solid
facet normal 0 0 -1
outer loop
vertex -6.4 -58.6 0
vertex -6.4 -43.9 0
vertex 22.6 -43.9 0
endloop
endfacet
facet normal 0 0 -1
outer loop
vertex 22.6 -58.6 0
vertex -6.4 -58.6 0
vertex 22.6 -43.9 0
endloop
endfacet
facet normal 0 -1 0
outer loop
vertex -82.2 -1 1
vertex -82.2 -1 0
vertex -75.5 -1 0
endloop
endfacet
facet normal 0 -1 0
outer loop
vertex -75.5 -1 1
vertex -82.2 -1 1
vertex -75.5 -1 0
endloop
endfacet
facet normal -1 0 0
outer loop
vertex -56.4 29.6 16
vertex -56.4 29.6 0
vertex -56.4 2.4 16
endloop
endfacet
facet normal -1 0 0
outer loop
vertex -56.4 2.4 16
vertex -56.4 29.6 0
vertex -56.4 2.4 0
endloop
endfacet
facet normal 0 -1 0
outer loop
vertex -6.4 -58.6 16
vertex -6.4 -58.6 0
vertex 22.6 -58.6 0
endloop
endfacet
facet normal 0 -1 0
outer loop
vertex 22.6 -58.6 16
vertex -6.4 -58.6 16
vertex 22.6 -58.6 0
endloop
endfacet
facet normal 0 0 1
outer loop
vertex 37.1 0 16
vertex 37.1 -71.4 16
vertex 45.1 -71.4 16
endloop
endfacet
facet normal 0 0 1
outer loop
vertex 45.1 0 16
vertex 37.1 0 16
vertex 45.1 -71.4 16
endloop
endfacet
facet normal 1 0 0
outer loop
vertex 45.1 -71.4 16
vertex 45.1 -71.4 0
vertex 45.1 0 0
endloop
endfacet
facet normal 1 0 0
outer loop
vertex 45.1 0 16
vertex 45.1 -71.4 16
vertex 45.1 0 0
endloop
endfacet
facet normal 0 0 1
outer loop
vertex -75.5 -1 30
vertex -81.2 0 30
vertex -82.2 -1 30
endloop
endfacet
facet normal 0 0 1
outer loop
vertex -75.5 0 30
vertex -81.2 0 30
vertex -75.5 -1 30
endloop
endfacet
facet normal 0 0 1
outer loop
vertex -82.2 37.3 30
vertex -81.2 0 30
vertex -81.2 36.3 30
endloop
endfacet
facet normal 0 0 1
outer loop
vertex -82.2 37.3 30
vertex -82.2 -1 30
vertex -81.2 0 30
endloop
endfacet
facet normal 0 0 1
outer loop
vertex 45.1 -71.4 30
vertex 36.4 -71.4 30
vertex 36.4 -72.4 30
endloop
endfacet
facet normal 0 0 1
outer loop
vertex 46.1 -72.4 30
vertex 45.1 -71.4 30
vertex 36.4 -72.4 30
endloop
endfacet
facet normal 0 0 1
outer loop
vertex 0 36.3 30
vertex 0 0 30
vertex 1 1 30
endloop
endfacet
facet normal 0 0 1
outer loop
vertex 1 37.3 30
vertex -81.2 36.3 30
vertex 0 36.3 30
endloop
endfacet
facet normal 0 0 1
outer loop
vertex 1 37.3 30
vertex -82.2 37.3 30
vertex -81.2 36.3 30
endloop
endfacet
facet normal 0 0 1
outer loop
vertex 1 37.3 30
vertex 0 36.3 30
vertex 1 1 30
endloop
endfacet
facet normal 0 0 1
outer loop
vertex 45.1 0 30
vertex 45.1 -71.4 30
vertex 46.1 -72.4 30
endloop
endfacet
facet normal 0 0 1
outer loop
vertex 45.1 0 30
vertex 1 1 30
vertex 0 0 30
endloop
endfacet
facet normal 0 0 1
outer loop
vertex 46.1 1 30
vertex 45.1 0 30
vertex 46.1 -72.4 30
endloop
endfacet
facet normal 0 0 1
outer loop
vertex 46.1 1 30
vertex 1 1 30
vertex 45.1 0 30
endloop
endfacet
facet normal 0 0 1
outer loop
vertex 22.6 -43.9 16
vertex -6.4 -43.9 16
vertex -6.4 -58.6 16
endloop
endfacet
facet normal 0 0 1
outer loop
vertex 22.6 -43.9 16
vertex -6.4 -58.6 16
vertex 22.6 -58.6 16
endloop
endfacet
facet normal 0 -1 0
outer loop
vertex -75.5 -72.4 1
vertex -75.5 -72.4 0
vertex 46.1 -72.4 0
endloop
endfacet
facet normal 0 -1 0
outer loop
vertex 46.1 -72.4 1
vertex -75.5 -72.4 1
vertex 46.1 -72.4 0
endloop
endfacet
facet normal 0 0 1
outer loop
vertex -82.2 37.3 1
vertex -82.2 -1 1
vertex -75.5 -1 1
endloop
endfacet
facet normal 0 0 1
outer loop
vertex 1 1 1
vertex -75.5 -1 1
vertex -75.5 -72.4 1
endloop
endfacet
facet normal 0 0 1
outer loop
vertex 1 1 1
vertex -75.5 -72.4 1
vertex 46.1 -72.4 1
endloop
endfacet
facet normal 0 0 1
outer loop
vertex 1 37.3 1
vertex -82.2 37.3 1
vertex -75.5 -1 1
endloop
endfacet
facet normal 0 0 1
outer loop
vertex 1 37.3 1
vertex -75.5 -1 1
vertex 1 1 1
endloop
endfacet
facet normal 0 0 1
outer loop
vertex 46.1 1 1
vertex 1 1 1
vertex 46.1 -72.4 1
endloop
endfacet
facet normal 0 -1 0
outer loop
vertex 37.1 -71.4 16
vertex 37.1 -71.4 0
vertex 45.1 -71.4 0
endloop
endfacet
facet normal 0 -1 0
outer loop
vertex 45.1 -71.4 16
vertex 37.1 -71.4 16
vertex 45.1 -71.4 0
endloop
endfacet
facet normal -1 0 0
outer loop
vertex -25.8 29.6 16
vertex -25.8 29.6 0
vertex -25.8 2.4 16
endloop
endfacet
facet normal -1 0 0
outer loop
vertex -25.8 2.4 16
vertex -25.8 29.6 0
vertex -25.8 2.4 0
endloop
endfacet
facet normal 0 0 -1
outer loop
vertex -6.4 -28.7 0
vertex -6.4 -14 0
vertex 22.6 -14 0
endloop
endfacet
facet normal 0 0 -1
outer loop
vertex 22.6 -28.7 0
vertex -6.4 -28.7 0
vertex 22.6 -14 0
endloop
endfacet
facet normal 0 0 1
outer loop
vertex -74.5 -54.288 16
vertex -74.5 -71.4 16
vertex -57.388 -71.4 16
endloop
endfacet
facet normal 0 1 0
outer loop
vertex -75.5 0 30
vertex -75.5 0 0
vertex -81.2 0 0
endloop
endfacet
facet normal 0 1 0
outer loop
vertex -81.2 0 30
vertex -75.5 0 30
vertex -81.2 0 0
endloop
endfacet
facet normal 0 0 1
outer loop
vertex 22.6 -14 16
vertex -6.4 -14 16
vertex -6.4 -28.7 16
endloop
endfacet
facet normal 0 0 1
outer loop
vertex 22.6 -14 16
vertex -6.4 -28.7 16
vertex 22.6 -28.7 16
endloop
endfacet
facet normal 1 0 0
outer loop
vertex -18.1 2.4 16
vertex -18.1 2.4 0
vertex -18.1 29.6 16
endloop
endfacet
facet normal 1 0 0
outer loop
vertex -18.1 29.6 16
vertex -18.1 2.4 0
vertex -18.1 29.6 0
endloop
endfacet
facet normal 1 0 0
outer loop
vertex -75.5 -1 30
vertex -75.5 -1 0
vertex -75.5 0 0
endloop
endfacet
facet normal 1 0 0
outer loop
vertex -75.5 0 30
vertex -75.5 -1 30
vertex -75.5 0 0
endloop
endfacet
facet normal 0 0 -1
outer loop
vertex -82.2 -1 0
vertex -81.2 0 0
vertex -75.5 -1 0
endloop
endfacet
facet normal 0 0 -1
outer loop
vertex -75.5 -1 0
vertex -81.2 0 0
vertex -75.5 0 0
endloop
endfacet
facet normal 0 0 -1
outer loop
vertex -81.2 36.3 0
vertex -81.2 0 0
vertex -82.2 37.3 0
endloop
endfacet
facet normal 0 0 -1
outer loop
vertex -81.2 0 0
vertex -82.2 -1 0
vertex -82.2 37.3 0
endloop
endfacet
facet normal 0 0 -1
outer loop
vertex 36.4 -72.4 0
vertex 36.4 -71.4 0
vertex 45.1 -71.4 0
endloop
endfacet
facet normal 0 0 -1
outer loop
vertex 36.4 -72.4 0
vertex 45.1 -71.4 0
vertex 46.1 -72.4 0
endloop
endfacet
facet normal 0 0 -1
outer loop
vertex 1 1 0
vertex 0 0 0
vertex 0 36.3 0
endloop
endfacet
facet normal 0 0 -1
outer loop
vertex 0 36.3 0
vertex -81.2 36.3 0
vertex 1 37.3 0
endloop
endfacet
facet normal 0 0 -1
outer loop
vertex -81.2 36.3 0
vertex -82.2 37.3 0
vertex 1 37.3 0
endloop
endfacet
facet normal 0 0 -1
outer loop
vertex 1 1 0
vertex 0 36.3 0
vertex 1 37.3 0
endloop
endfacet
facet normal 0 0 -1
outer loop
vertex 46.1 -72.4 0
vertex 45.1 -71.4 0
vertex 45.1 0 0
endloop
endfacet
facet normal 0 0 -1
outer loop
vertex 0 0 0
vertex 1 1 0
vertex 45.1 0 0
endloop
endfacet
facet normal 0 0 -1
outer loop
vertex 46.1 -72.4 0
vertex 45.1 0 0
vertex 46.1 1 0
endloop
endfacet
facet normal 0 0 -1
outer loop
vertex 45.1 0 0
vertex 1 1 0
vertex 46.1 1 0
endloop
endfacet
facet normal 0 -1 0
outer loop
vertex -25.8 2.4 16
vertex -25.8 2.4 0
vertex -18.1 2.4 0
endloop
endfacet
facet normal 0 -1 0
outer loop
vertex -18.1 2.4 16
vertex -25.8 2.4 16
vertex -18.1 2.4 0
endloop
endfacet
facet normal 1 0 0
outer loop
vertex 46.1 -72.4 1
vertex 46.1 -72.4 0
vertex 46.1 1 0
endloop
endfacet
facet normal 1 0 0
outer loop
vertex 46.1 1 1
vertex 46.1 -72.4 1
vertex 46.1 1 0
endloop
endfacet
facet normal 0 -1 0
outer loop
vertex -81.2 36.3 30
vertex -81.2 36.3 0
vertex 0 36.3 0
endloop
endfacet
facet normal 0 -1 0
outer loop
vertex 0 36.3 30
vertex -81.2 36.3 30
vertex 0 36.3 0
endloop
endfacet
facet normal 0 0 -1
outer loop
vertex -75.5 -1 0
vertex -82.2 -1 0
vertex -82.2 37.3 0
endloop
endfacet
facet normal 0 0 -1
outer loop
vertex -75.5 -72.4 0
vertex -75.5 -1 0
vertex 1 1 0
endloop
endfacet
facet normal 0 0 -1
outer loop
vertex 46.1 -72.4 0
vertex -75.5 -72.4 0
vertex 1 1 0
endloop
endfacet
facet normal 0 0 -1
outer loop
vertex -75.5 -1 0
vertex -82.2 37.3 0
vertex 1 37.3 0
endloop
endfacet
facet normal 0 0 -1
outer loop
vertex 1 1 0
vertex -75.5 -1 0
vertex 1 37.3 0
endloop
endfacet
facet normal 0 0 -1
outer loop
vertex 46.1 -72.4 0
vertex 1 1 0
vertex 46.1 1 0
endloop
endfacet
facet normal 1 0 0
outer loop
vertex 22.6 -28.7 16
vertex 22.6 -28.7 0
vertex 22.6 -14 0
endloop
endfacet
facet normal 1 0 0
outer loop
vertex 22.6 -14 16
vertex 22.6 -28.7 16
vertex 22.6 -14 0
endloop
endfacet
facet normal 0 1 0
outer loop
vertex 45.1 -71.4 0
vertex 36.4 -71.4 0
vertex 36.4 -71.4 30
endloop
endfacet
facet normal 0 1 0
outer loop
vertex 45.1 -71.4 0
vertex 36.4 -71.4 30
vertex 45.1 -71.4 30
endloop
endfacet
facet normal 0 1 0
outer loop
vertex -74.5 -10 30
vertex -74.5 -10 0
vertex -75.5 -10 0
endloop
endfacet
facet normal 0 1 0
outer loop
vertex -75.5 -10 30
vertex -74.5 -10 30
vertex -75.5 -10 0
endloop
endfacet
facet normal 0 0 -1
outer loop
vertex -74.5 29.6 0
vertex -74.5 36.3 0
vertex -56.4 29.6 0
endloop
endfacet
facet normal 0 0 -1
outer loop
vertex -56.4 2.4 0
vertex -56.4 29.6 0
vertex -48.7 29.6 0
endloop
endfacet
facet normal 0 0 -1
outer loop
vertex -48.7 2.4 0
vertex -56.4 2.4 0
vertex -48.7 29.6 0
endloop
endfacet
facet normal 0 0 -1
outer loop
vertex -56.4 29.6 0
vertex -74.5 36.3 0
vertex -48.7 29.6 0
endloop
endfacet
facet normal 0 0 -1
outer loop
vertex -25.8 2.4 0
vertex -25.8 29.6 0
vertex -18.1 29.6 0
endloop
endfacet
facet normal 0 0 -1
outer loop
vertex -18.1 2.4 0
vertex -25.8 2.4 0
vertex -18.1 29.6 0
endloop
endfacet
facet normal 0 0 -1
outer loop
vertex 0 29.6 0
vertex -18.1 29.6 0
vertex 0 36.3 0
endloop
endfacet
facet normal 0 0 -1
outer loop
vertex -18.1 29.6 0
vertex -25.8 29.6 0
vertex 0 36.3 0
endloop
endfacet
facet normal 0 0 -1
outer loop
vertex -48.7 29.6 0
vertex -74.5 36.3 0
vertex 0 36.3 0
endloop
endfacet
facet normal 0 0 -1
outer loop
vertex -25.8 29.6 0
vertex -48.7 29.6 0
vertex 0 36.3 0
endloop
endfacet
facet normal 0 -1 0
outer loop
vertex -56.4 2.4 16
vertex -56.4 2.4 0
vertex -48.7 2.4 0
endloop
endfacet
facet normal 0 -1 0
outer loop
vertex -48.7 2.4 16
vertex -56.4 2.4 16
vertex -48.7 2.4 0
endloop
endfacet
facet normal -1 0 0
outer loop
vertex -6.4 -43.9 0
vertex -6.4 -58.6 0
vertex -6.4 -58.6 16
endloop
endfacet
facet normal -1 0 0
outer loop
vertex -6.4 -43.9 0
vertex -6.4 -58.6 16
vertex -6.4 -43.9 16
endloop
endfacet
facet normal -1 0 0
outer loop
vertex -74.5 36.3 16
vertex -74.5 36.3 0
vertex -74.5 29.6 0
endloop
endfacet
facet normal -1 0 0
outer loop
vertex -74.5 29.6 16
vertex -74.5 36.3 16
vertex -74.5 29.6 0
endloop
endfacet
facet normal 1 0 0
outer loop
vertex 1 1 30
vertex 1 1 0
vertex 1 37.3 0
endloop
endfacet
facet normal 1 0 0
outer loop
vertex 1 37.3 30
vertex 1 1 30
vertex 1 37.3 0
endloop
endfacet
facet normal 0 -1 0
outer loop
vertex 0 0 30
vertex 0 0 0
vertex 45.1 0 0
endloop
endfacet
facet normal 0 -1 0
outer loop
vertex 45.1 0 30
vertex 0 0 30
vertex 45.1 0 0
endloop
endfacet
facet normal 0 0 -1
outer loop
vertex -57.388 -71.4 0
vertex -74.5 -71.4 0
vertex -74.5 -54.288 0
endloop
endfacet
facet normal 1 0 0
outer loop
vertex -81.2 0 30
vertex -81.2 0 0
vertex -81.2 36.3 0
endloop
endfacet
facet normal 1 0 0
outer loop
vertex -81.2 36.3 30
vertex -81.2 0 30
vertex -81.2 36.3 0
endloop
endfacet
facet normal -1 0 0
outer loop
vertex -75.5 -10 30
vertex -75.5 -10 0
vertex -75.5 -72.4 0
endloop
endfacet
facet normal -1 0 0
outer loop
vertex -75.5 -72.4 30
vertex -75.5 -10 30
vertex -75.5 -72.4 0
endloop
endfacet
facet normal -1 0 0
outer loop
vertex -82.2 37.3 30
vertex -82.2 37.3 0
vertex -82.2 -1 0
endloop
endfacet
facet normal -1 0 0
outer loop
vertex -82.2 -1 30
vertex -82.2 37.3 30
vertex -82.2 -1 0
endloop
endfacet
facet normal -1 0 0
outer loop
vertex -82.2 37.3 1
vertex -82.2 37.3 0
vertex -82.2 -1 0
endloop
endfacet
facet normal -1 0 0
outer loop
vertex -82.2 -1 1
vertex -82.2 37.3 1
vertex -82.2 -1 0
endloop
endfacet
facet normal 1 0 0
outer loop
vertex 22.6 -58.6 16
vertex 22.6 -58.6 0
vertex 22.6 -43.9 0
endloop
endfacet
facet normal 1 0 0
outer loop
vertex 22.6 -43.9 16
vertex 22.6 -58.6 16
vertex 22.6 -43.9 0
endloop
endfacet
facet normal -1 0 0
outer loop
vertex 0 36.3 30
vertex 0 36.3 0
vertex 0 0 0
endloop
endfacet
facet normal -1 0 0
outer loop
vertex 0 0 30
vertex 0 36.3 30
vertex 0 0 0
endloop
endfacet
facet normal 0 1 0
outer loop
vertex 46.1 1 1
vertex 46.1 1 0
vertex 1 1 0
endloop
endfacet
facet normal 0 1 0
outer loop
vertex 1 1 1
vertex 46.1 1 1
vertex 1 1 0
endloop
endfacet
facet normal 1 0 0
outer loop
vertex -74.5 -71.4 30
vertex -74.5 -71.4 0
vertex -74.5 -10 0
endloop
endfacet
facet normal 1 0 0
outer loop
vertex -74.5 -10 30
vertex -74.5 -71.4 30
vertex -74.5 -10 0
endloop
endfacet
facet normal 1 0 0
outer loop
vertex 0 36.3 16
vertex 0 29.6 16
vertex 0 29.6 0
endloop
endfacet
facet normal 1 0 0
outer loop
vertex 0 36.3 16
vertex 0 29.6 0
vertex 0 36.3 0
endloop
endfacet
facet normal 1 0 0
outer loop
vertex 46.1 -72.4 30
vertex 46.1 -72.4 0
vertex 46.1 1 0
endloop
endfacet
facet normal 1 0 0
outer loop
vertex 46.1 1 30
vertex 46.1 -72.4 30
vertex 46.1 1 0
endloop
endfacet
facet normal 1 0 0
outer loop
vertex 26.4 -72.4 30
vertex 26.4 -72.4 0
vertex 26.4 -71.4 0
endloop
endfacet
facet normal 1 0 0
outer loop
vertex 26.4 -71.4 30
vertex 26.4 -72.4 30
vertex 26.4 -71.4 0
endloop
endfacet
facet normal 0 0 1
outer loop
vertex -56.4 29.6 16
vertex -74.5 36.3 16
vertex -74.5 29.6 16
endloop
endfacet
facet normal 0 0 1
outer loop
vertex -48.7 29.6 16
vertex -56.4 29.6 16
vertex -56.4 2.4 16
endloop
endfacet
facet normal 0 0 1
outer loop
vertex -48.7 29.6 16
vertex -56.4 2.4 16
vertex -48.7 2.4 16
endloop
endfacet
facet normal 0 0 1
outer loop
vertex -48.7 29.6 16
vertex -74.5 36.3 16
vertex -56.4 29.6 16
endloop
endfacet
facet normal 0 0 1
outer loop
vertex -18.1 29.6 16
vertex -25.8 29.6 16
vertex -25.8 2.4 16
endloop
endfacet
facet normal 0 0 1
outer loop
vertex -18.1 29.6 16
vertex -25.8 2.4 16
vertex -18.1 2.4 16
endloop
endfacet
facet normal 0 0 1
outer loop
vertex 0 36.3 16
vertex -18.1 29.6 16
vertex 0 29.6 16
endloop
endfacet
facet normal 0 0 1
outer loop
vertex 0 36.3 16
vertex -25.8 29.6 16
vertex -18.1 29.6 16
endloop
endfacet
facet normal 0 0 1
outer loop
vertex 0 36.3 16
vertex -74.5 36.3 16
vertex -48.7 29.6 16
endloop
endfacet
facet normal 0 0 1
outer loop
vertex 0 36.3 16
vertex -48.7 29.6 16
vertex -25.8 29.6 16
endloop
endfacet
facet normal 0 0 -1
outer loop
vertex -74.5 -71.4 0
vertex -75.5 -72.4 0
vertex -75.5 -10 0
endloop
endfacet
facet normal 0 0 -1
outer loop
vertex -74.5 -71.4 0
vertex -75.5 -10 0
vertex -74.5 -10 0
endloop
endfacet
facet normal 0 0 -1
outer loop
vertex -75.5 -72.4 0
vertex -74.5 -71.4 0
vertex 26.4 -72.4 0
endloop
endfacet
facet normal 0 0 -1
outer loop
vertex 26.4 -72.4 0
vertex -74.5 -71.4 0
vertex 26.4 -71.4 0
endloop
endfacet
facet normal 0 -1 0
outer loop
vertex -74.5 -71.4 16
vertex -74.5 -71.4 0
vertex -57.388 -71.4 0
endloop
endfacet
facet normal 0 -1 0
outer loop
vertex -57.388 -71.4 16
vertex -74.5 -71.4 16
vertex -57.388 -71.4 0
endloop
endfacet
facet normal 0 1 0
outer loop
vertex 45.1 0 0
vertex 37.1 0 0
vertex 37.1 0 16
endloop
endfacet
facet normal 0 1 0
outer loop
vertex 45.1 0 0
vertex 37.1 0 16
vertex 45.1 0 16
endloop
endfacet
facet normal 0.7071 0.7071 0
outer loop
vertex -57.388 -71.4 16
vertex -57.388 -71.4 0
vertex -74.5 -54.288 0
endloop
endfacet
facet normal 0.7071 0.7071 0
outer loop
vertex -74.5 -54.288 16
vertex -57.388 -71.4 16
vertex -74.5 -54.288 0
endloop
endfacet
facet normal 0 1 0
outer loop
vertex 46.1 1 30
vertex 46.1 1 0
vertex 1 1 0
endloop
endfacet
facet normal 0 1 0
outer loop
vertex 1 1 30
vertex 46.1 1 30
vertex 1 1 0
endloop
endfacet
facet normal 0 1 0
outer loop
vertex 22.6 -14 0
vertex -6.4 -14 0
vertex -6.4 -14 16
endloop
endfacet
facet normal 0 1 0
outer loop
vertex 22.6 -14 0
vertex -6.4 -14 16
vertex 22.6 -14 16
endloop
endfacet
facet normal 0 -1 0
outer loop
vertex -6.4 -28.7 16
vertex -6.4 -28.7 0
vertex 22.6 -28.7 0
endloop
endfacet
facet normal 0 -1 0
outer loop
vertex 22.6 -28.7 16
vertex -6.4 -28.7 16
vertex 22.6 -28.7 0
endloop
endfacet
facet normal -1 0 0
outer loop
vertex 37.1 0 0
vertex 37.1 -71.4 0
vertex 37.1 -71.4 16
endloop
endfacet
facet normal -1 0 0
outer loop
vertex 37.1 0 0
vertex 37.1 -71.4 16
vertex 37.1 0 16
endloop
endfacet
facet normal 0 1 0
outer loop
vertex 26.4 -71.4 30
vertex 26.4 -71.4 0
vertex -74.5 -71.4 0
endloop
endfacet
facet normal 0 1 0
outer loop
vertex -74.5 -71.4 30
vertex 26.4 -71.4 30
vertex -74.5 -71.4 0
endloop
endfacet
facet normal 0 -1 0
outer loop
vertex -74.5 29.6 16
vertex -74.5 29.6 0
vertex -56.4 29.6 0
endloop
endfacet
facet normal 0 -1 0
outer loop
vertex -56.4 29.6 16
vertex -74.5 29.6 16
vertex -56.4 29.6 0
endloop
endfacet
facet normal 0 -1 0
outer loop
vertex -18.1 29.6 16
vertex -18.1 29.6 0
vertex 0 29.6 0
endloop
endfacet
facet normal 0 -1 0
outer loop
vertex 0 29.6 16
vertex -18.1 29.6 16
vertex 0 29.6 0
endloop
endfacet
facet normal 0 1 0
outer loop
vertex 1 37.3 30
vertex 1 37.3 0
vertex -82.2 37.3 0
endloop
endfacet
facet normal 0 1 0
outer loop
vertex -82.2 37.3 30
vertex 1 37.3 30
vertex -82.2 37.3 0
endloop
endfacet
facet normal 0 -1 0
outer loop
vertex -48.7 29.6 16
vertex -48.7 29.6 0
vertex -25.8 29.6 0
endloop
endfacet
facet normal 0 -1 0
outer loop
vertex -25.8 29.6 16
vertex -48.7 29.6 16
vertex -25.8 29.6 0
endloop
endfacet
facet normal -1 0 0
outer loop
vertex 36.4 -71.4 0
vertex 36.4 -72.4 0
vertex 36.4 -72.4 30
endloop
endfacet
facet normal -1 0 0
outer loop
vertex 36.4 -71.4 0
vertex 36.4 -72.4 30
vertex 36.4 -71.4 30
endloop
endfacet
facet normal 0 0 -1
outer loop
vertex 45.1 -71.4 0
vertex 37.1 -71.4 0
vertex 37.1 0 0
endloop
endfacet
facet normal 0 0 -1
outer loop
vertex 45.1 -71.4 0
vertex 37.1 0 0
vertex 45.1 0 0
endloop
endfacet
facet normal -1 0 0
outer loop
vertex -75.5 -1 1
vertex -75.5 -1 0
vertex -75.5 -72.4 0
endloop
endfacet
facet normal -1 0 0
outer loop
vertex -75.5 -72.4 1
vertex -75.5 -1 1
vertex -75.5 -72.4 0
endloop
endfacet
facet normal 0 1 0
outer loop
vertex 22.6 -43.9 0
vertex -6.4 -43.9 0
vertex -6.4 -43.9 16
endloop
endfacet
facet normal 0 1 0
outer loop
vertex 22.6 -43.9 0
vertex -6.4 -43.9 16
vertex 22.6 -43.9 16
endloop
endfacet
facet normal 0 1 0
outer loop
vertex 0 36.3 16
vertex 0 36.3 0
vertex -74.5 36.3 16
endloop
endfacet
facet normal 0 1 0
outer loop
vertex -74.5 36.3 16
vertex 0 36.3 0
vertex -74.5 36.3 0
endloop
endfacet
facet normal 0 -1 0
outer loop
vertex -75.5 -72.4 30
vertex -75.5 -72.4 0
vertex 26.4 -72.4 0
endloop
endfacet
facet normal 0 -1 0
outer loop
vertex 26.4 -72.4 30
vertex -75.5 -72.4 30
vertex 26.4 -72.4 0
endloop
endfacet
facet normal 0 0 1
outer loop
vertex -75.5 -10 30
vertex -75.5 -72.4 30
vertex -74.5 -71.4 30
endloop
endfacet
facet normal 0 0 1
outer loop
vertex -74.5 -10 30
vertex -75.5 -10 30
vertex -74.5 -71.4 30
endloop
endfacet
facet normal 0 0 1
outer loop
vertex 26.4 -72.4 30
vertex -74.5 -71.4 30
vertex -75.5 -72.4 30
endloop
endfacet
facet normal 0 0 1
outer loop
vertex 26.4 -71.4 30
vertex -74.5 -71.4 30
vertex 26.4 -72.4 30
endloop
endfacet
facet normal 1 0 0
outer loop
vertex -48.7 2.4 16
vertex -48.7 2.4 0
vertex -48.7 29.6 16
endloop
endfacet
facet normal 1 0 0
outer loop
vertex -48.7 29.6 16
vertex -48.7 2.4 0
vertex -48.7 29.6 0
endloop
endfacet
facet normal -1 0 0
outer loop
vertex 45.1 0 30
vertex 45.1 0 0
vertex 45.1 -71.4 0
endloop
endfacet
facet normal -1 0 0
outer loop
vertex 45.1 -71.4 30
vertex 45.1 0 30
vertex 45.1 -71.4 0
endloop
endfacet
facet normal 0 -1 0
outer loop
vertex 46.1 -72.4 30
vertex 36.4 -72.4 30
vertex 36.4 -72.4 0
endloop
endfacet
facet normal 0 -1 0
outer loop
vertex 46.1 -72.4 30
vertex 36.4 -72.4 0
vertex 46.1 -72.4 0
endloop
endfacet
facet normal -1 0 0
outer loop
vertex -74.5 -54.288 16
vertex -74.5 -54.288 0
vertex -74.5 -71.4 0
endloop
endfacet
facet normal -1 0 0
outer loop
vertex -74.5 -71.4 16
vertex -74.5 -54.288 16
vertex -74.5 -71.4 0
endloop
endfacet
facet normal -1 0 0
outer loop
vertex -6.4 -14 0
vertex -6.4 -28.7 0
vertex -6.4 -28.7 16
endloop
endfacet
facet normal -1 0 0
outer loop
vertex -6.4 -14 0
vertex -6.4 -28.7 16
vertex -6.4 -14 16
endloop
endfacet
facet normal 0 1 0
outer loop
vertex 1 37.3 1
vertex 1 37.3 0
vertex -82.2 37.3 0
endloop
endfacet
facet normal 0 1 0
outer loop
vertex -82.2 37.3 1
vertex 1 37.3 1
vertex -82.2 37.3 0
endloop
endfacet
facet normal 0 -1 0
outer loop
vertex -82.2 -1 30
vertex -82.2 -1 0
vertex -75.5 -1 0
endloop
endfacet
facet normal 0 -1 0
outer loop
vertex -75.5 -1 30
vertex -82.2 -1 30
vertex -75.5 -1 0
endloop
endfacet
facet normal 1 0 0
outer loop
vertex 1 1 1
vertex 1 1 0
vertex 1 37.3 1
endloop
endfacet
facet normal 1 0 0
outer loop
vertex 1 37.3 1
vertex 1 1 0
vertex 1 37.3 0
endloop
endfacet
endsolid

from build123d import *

# Parameters (mm, degrees)
F2_DEPTH = 16
F1_W     = 29
F1_H     = 14.7
F1_W_2   = 8
F1_H_2   = 71.4
F0_W     = 1
F0_H     = 1
F0_H_2   = 9
F0_W_2   = 10
F0_W_3   = 8.7
F3_DEPTH = 1
F4_DEPTH = 30


with BuildPart() as f2:
    # F1 (on face) → F2 (new body)
    with BuildSketch(Plane.XY):
        Polygon((-74.5, 29.6), (-56.4, 29.6), (-56.4, 2.4), (-48.7, 2.4), (-48.7, 29.6), (-25.8, 29.6), (-25.8, 2.4), (-18.1, 2.4), (-18.1, 29.6), (0, 29.6), (0, 36.3), (-74.5, 36.3), align=None)
    extrude(amount=F2_DEPTH)


with BuildPart() as f2b:
    # F1 (on face) → F2, piece 2 (new body)
    with BuildSketch(Plane.XY):
        Polygon((-74.5, -54.2880158953), (-74.5, -71.4), (-57.3880158953, -71.4), align=None)
    extrude(amount=F2_DEPTH)


with BuildPart() as f2c:
    # F1 (on face) → F2, piece 3 (new body)
    with BuildSketch(Plane.XY):
        with Locations((8.1, -21.35)):
            Rectangle(F1_W, F1_H)
    extrude(amount=F2_DEPTH)


with BuildPart() as f2d:
    # F1 (on face) → F2, piece 4 (new body)
    with BuildSketch(Plane.XY):
        with Locations((8.1, -51.25)):
            Rectangle(F1_W, F1_H)
    extrude(amount=F2_DEPTH)


with BuildPart() as f2e:
    # F1 (on face) → F2, piece 5 (new body)
    with BuildSketch(Plane.XY):
        with Locations((41.1, -35.7)):
            Rectangle(F1_W_2, F1_H_2)
    extrude(amount=F2_DEPTH)


with BuildPart() as f3:
    # F0 (on Top) → F3 (new body)
    with BuildSketch(Plane.XY):
        Polygon((-81.2, 36.3), (-74.5, 36.3), (0, 36.3), (0, 1), (1, 1), (1, 37.3), (-82.2, 37.3), (-82.2, -1), (-75.5, -1), (-75.5, 0), (-81.2, 0), align=None)
        with Locations((-75, -0.5)):
            Rectangle(F0_W, F0_H)
        with Locations((0.5, 0.5)):
            Rectangle(F0_W, F0_H)
        with Locations((-75, -5.5)):
            Rectangle(F0_W, F0_H_2)
        Polygon((46.1, 1), (1, 1), (1, 0), (45.1, 0), (45.1, -71.4), (45.1, -72.4), (46.1, -72.4), align=None)
        Polygon((26.4, -71.4), (0, -71.4), (-74.5, -71.4), (-74.5, -10), (-75.5, -10), (-75.5, -72.4), (26.4, -72.4), align=None)
        with Locations((31.4, -71.9)):
            Rectangle(F0_W_2, F0_H)
        with Locations((40.75, -71.9)):
            Rectangle(F0_W_3, F0_H)
        Polygon((0, 0), (-74.5, 0), (-74.5, -1), (-74.5, -10), (-74.5, -71.4), (0, -71.4), align=None)
        Polygon((0, 36.3), (-74.5, 36.3), (-74.5, 0), (0, 0), (0, 1), align=None)
        Polygon((-74.5, 0), (-74.5, 36.3), (-81.2, 36.3), (-81.2, 0), (-75.5, 0), align=None)
        Polygon((1, 0), (0, 0), (0, -71.4), (26.4, -71.4), (36.4, -71.4), (45.1, -71.4), (45.1, 0), align=None)
    extrude(amount=F3_DEPTH)


with BuildPart() as f4:
    # F0 (on Top) → F4 (new body)
    with BuildSketch(Plane.XY):
        Polygon((26.4, -71.4), (0, -71.4), (-74.5, -71.4), (-74.5, -10), (-75.5, -10), (-75.5, -72.4), (26.4, -72.4), align=None)
    extrude(amount=F4_DEPTH)


with BuildPart() as f4b:
    # F0 (on Top) → F4, piece 2 (new body)
    with BuildSketch(Plane.XY):
        with Locations((40.75, -71.9)):
            Rectangle(F0_W_3, F0_H)
        Polygon((46.1, 1), (1, 1), (1, 0), (45.1, 0), (45.1, -71.4), (45.1, -72.4), (46.1, -72.4), align=None)
        with Locations((0.5, 0.5)):
            Rectangle(F0_W, F0_H)
        Polygon((-81.2, 36.3), (-74.5, 36.3), (0, 36.3), (0, 1), (1, 1), (1, 37.3), (-82.2, 37.3), (-82.2, -1), (-75.5, -1), (-75.5, 0), (-81.2, 0), align=None)
    extrude(amount=F4_DEPTH)


solid = Compound([f2.part, f2b.part, f2c.part, f2d.part, f2e.part, f3.part, f4.part, f4b.part])
